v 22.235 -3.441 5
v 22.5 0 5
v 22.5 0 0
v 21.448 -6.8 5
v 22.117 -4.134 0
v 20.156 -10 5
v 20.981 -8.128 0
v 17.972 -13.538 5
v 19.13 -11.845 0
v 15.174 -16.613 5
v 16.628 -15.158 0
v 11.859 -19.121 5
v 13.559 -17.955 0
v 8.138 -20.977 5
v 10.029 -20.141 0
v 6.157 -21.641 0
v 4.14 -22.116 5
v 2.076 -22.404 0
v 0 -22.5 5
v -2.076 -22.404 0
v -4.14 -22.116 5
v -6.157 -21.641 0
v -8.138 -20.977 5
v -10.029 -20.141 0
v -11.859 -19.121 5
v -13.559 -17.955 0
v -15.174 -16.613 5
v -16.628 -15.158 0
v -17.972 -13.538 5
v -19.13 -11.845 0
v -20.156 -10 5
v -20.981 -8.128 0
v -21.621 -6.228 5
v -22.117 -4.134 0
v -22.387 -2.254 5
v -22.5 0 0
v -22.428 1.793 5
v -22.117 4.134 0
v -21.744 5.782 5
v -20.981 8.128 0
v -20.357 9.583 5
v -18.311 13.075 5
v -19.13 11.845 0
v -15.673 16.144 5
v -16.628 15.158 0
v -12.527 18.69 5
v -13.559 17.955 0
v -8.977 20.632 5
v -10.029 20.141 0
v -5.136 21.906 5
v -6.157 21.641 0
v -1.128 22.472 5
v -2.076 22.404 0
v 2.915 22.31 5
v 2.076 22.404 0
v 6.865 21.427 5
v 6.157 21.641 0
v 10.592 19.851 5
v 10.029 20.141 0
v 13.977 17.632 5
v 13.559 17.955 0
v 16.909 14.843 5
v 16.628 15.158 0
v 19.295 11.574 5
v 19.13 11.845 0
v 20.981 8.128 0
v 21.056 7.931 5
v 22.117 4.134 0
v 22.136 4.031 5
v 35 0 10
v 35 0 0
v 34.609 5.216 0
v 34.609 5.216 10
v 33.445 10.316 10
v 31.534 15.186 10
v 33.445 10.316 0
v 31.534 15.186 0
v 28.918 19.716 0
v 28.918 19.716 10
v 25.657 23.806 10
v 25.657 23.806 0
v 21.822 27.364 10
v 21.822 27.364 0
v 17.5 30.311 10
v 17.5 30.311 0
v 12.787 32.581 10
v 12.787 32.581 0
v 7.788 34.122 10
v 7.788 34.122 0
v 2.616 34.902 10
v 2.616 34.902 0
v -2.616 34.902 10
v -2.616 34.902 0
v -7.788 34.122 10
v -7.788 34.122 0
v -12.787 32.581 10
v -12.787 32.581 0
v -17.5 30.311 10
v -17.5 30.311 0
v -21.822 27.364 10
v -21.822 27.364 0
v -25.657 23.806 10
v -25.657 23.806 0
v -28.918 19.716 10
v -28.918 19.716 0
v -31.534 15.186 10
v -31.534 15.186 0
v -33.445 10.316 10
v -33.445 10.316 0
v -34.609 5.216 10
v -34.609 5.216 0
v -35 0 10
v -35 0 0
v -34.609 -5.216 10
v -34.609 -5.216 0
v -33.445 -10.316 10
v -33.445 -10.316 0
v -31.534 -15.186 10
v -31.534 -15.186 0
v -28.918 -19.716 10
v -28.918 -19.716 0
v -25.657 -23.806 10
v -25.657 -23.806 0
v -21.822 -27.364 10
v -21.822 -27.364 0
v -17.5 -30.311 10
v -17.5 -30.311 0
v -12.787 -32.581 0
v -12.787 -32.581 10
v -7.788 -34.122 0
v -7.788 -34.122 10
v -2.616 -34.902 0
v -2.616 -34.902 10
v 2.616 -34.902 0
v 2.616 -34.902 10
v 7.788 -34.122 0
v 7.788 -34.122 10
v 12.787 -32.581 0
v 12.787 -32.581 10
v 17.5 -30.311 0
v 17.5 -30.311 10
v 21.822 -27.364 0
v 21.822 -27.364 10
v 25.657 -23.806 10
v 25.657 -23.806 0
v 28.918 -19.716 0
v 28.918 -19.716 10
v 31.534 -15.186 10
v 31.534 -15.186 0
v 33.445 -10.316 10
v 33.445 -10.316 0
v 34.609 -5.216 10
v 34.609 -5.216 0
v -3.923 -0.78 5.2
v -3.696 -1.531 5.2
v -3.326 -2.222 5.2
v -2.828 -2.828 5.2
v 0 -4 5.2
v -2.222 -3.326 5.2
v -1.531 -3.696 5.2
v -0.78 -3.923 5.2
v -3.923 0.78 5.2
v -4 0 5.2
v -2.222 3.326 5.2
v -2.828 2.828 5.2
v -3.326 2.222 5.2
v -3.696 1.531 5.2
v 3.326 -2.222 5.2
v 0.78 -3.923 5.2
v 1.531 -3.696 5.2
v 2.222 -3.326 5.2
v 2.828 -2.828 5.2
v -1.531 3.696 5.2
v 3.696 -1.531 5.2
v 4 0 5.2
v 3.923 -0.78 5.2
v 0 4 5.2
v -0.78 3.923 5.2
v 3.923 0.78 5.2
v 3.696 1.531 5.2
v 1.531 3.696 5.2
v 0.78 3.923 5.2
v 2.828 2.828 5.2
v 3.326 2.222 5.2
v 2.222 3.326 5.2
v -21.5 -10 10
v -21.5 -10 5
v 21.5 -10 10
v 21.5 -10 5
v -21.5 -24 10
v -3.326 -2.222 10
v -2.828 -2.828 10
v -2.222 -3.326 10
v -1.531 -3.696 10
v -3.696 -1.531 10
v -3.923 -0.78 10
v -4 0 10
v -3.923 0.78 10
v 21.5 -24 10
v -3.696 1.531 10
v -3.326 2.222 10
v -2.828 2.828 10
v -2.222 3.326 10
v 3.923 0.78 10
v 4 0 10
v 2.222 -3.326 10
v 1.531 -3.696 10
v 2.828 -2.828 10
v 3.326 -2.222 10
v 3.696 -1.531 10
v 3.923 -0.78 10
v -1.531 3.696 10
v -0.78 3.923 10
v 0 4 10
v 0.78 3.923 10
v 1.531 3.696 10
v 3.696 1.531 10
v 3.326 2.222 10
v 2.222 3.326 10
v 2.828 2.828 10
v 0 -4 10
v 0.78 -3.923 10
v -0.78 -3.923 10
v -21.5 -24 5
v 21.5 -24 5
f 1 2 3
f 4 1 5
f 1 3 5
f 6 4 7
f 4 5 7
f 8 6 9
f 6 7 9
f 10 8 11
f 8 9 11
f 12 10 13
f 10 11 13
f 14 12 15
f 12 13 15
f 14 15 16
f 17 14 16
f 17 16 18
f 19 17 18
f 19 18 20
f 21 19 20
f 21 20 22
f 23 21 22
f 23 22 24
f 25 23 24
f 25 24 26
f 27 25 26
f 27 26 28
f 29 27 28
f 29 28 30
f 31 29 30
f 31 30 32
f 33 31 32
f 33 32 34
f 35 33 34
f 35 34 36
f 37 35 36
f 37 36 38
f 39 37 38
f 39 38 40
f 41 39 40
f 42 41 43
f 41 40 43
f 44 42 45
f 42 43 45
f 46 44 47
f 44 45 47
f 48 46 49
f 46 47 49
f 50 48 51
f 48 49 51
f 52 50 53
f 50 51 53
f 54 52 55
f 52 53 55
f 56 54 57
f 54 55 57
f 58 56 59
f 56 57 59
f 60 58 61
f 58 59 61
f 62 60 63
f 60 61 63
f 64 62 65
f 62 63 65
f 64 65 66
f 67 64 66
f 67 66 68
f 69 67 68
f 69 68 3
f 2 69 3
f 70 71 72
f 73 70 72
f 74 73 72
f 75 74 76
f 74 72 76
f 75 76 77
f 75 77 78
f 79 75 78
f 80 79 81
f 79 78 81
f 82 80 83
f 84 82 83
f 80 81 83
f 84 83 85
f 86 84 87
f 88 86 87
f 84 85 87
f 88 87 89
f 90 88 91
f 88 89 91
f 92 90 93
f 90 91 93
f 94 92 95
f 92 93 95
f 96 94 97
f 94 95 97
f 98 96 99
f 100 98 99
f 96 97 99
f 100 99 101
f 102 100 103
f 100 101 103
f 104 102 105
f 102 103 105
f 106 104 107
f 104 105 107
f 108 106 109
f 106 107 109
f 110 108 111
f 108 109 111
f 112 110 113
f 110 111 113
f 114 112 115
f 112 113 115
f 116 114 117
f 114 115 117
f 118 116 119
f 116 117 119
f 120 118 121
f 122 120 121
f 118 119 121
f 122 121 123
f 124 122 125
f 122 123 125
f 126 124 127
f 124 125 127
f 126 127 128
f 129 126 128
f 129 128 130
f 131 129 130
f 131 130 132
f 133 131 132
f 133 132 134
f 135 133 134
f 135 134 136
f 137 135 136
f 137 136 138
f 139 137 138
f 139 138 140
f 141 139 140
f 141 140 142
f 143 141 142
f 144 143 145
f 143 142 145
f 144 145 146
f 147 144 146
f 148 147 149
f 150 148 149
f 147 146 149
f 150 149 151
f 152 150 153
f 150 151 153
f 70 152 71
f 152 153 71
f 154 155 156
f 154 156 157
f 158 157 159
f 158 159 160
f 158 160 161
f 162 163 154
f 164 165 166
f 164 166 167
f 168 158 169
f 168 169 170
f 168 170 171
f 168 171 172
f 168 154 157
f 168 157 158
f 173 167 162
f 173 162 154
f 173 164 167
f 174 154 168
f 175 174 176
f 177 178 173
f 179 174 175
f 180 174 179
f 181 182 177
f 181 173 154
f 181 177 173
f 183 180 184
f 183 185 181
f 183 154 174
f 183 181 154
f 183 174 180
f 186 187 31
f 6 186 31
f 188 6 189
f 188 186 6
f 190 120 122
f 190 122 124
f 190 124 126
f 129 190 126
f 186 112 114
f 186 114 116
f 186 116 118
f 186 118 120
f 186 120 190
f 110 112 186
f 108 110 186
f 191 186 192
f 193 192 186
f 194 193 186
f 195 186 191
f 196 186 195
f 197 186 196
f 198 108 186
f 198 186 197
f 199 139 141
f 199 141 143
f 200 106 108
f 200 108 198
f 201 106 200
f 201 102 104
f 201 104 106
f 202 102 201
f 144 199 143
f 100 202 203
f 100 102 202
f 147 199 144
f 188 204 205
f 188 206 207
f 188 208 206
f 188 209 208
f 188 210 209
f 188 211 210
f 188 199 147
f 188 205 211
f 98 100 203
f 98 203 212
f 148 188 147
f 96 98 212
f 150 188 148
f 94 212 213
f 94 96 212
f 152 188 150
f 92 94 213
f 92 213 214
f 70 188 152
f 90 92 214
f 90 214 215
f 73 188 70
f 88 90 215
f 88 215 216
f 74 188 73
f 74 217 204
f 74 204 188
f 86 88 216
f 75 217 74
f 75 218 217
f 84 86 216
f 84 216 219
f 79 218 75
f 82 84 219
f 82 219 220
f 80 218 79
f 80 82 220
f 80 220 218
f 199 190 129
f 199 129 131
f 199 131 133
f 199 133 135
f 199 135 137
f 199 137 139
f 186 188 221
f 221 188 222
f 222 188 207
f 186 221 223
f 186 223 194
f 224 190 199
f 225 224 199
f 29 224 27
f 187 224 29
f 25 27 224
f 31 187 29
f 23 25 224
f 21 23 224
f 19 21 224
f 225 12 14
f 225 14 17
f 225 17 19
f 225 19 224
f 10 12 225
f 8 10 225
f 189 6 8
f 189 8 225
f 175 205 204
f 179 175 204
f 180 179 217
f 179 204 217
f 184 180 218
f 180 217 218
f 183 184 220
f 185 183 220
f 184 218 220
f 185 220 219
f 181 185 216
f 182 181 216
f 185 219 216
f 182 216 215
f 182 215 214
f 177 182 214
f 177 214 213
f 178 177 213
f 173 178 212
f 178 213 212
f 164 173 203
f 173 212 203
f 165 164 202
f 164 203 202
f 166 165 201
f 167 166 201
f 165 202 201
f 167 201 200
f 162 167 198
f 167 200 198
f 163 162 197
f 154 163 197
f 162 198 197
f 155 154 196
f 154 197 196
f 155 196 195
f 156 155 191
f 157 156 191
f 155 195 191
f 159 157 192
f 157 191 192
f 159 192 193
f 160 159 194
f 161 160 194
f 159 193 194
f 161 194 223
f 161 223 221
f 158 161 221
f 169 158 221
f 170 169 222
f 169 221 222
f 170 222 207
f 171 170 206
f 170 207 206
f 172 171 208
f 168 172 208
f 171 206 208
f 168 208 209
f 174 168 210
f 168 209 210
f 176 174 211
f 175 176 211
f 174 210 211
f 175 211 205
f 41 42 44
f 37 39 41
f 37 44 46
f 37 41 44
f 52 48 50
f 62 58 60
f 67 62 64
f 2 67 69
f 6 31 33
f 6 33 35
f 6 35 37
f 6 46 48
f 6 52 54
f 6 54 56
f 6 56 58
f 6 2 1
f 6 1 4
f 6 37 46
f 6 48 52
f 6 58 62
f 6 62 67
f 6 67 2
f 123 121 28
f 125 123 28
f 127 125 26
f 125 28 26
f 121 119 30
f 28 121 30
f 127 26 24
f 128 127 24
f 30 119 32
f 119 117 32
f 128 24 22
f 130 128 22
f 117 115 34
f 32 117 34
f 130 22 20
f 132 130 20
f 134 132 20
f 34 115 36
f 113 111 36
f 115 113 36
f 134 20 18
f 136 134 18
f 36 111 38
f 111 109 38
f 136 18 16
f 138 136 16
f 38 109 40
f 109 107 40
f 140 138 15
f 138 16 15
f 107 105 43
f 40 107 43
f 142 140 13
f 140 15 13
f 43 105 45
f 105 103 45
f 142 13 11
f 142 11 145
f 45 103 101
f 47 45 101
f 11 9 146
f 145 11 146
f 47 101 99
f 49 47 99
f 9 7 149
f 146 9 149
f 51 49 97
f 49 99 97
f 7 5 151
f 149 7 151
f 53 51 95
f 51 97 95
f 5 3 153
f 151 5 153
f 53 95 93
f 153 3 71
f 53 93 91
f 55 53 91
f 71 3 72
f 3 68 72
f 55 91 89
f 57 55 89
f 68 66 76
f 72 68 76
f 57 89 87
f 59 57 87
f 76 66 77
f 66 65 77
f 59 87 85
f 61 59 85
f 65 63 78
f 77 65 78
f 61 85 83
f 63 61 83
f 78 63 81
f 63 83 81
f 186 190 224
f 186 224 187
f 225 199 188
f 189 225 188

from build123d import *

# Parameters (mm, degrees)
F0_R     = 35
F1_DEPTH = 10
F2_R     = 22.5
F3_DEPTH = 5
F4_W     = 43
F4_H     = 14
F5_DEPTH = 5
F6_R     = 4
F7_DEPTH = 4.8


with BuildPart() as f1:
    # F0 (on Top) → F1 (new body)
    with BuildSketch(Plane.XY):
        Circle(F0_R)
    extrude(amount=F1_DEPTH)

    # F2 (on face) → F3 (cut)
    with BuildSketch(Plane(origin=(0, 0, 0), x_dir=(1, 0, 0), z_dir=(0, 0, -1))):
        Circle(F2_R)
    extrude(amount=-F3_DEPTH, mode=Mode.SUBTRACT)

    # F4 (on face) → F5 (cut)
    with BuildSketch(Plane.XY.offset(10)):
        with Locations((0, -17)):
            Rectangle(F4_W, F4_H)
    extrude(amount=-F5_DEPTH, mode=Mode.SUBTRACT)

    # F6 (on face) → F7 (cut)
    with BuildSketch(Plane.XY.offset(10)):
        Circle(F6_R)
    extrude(amount=-F7_DEPTH, mode=Mode.SUBTRACT)


solid = f1.part
